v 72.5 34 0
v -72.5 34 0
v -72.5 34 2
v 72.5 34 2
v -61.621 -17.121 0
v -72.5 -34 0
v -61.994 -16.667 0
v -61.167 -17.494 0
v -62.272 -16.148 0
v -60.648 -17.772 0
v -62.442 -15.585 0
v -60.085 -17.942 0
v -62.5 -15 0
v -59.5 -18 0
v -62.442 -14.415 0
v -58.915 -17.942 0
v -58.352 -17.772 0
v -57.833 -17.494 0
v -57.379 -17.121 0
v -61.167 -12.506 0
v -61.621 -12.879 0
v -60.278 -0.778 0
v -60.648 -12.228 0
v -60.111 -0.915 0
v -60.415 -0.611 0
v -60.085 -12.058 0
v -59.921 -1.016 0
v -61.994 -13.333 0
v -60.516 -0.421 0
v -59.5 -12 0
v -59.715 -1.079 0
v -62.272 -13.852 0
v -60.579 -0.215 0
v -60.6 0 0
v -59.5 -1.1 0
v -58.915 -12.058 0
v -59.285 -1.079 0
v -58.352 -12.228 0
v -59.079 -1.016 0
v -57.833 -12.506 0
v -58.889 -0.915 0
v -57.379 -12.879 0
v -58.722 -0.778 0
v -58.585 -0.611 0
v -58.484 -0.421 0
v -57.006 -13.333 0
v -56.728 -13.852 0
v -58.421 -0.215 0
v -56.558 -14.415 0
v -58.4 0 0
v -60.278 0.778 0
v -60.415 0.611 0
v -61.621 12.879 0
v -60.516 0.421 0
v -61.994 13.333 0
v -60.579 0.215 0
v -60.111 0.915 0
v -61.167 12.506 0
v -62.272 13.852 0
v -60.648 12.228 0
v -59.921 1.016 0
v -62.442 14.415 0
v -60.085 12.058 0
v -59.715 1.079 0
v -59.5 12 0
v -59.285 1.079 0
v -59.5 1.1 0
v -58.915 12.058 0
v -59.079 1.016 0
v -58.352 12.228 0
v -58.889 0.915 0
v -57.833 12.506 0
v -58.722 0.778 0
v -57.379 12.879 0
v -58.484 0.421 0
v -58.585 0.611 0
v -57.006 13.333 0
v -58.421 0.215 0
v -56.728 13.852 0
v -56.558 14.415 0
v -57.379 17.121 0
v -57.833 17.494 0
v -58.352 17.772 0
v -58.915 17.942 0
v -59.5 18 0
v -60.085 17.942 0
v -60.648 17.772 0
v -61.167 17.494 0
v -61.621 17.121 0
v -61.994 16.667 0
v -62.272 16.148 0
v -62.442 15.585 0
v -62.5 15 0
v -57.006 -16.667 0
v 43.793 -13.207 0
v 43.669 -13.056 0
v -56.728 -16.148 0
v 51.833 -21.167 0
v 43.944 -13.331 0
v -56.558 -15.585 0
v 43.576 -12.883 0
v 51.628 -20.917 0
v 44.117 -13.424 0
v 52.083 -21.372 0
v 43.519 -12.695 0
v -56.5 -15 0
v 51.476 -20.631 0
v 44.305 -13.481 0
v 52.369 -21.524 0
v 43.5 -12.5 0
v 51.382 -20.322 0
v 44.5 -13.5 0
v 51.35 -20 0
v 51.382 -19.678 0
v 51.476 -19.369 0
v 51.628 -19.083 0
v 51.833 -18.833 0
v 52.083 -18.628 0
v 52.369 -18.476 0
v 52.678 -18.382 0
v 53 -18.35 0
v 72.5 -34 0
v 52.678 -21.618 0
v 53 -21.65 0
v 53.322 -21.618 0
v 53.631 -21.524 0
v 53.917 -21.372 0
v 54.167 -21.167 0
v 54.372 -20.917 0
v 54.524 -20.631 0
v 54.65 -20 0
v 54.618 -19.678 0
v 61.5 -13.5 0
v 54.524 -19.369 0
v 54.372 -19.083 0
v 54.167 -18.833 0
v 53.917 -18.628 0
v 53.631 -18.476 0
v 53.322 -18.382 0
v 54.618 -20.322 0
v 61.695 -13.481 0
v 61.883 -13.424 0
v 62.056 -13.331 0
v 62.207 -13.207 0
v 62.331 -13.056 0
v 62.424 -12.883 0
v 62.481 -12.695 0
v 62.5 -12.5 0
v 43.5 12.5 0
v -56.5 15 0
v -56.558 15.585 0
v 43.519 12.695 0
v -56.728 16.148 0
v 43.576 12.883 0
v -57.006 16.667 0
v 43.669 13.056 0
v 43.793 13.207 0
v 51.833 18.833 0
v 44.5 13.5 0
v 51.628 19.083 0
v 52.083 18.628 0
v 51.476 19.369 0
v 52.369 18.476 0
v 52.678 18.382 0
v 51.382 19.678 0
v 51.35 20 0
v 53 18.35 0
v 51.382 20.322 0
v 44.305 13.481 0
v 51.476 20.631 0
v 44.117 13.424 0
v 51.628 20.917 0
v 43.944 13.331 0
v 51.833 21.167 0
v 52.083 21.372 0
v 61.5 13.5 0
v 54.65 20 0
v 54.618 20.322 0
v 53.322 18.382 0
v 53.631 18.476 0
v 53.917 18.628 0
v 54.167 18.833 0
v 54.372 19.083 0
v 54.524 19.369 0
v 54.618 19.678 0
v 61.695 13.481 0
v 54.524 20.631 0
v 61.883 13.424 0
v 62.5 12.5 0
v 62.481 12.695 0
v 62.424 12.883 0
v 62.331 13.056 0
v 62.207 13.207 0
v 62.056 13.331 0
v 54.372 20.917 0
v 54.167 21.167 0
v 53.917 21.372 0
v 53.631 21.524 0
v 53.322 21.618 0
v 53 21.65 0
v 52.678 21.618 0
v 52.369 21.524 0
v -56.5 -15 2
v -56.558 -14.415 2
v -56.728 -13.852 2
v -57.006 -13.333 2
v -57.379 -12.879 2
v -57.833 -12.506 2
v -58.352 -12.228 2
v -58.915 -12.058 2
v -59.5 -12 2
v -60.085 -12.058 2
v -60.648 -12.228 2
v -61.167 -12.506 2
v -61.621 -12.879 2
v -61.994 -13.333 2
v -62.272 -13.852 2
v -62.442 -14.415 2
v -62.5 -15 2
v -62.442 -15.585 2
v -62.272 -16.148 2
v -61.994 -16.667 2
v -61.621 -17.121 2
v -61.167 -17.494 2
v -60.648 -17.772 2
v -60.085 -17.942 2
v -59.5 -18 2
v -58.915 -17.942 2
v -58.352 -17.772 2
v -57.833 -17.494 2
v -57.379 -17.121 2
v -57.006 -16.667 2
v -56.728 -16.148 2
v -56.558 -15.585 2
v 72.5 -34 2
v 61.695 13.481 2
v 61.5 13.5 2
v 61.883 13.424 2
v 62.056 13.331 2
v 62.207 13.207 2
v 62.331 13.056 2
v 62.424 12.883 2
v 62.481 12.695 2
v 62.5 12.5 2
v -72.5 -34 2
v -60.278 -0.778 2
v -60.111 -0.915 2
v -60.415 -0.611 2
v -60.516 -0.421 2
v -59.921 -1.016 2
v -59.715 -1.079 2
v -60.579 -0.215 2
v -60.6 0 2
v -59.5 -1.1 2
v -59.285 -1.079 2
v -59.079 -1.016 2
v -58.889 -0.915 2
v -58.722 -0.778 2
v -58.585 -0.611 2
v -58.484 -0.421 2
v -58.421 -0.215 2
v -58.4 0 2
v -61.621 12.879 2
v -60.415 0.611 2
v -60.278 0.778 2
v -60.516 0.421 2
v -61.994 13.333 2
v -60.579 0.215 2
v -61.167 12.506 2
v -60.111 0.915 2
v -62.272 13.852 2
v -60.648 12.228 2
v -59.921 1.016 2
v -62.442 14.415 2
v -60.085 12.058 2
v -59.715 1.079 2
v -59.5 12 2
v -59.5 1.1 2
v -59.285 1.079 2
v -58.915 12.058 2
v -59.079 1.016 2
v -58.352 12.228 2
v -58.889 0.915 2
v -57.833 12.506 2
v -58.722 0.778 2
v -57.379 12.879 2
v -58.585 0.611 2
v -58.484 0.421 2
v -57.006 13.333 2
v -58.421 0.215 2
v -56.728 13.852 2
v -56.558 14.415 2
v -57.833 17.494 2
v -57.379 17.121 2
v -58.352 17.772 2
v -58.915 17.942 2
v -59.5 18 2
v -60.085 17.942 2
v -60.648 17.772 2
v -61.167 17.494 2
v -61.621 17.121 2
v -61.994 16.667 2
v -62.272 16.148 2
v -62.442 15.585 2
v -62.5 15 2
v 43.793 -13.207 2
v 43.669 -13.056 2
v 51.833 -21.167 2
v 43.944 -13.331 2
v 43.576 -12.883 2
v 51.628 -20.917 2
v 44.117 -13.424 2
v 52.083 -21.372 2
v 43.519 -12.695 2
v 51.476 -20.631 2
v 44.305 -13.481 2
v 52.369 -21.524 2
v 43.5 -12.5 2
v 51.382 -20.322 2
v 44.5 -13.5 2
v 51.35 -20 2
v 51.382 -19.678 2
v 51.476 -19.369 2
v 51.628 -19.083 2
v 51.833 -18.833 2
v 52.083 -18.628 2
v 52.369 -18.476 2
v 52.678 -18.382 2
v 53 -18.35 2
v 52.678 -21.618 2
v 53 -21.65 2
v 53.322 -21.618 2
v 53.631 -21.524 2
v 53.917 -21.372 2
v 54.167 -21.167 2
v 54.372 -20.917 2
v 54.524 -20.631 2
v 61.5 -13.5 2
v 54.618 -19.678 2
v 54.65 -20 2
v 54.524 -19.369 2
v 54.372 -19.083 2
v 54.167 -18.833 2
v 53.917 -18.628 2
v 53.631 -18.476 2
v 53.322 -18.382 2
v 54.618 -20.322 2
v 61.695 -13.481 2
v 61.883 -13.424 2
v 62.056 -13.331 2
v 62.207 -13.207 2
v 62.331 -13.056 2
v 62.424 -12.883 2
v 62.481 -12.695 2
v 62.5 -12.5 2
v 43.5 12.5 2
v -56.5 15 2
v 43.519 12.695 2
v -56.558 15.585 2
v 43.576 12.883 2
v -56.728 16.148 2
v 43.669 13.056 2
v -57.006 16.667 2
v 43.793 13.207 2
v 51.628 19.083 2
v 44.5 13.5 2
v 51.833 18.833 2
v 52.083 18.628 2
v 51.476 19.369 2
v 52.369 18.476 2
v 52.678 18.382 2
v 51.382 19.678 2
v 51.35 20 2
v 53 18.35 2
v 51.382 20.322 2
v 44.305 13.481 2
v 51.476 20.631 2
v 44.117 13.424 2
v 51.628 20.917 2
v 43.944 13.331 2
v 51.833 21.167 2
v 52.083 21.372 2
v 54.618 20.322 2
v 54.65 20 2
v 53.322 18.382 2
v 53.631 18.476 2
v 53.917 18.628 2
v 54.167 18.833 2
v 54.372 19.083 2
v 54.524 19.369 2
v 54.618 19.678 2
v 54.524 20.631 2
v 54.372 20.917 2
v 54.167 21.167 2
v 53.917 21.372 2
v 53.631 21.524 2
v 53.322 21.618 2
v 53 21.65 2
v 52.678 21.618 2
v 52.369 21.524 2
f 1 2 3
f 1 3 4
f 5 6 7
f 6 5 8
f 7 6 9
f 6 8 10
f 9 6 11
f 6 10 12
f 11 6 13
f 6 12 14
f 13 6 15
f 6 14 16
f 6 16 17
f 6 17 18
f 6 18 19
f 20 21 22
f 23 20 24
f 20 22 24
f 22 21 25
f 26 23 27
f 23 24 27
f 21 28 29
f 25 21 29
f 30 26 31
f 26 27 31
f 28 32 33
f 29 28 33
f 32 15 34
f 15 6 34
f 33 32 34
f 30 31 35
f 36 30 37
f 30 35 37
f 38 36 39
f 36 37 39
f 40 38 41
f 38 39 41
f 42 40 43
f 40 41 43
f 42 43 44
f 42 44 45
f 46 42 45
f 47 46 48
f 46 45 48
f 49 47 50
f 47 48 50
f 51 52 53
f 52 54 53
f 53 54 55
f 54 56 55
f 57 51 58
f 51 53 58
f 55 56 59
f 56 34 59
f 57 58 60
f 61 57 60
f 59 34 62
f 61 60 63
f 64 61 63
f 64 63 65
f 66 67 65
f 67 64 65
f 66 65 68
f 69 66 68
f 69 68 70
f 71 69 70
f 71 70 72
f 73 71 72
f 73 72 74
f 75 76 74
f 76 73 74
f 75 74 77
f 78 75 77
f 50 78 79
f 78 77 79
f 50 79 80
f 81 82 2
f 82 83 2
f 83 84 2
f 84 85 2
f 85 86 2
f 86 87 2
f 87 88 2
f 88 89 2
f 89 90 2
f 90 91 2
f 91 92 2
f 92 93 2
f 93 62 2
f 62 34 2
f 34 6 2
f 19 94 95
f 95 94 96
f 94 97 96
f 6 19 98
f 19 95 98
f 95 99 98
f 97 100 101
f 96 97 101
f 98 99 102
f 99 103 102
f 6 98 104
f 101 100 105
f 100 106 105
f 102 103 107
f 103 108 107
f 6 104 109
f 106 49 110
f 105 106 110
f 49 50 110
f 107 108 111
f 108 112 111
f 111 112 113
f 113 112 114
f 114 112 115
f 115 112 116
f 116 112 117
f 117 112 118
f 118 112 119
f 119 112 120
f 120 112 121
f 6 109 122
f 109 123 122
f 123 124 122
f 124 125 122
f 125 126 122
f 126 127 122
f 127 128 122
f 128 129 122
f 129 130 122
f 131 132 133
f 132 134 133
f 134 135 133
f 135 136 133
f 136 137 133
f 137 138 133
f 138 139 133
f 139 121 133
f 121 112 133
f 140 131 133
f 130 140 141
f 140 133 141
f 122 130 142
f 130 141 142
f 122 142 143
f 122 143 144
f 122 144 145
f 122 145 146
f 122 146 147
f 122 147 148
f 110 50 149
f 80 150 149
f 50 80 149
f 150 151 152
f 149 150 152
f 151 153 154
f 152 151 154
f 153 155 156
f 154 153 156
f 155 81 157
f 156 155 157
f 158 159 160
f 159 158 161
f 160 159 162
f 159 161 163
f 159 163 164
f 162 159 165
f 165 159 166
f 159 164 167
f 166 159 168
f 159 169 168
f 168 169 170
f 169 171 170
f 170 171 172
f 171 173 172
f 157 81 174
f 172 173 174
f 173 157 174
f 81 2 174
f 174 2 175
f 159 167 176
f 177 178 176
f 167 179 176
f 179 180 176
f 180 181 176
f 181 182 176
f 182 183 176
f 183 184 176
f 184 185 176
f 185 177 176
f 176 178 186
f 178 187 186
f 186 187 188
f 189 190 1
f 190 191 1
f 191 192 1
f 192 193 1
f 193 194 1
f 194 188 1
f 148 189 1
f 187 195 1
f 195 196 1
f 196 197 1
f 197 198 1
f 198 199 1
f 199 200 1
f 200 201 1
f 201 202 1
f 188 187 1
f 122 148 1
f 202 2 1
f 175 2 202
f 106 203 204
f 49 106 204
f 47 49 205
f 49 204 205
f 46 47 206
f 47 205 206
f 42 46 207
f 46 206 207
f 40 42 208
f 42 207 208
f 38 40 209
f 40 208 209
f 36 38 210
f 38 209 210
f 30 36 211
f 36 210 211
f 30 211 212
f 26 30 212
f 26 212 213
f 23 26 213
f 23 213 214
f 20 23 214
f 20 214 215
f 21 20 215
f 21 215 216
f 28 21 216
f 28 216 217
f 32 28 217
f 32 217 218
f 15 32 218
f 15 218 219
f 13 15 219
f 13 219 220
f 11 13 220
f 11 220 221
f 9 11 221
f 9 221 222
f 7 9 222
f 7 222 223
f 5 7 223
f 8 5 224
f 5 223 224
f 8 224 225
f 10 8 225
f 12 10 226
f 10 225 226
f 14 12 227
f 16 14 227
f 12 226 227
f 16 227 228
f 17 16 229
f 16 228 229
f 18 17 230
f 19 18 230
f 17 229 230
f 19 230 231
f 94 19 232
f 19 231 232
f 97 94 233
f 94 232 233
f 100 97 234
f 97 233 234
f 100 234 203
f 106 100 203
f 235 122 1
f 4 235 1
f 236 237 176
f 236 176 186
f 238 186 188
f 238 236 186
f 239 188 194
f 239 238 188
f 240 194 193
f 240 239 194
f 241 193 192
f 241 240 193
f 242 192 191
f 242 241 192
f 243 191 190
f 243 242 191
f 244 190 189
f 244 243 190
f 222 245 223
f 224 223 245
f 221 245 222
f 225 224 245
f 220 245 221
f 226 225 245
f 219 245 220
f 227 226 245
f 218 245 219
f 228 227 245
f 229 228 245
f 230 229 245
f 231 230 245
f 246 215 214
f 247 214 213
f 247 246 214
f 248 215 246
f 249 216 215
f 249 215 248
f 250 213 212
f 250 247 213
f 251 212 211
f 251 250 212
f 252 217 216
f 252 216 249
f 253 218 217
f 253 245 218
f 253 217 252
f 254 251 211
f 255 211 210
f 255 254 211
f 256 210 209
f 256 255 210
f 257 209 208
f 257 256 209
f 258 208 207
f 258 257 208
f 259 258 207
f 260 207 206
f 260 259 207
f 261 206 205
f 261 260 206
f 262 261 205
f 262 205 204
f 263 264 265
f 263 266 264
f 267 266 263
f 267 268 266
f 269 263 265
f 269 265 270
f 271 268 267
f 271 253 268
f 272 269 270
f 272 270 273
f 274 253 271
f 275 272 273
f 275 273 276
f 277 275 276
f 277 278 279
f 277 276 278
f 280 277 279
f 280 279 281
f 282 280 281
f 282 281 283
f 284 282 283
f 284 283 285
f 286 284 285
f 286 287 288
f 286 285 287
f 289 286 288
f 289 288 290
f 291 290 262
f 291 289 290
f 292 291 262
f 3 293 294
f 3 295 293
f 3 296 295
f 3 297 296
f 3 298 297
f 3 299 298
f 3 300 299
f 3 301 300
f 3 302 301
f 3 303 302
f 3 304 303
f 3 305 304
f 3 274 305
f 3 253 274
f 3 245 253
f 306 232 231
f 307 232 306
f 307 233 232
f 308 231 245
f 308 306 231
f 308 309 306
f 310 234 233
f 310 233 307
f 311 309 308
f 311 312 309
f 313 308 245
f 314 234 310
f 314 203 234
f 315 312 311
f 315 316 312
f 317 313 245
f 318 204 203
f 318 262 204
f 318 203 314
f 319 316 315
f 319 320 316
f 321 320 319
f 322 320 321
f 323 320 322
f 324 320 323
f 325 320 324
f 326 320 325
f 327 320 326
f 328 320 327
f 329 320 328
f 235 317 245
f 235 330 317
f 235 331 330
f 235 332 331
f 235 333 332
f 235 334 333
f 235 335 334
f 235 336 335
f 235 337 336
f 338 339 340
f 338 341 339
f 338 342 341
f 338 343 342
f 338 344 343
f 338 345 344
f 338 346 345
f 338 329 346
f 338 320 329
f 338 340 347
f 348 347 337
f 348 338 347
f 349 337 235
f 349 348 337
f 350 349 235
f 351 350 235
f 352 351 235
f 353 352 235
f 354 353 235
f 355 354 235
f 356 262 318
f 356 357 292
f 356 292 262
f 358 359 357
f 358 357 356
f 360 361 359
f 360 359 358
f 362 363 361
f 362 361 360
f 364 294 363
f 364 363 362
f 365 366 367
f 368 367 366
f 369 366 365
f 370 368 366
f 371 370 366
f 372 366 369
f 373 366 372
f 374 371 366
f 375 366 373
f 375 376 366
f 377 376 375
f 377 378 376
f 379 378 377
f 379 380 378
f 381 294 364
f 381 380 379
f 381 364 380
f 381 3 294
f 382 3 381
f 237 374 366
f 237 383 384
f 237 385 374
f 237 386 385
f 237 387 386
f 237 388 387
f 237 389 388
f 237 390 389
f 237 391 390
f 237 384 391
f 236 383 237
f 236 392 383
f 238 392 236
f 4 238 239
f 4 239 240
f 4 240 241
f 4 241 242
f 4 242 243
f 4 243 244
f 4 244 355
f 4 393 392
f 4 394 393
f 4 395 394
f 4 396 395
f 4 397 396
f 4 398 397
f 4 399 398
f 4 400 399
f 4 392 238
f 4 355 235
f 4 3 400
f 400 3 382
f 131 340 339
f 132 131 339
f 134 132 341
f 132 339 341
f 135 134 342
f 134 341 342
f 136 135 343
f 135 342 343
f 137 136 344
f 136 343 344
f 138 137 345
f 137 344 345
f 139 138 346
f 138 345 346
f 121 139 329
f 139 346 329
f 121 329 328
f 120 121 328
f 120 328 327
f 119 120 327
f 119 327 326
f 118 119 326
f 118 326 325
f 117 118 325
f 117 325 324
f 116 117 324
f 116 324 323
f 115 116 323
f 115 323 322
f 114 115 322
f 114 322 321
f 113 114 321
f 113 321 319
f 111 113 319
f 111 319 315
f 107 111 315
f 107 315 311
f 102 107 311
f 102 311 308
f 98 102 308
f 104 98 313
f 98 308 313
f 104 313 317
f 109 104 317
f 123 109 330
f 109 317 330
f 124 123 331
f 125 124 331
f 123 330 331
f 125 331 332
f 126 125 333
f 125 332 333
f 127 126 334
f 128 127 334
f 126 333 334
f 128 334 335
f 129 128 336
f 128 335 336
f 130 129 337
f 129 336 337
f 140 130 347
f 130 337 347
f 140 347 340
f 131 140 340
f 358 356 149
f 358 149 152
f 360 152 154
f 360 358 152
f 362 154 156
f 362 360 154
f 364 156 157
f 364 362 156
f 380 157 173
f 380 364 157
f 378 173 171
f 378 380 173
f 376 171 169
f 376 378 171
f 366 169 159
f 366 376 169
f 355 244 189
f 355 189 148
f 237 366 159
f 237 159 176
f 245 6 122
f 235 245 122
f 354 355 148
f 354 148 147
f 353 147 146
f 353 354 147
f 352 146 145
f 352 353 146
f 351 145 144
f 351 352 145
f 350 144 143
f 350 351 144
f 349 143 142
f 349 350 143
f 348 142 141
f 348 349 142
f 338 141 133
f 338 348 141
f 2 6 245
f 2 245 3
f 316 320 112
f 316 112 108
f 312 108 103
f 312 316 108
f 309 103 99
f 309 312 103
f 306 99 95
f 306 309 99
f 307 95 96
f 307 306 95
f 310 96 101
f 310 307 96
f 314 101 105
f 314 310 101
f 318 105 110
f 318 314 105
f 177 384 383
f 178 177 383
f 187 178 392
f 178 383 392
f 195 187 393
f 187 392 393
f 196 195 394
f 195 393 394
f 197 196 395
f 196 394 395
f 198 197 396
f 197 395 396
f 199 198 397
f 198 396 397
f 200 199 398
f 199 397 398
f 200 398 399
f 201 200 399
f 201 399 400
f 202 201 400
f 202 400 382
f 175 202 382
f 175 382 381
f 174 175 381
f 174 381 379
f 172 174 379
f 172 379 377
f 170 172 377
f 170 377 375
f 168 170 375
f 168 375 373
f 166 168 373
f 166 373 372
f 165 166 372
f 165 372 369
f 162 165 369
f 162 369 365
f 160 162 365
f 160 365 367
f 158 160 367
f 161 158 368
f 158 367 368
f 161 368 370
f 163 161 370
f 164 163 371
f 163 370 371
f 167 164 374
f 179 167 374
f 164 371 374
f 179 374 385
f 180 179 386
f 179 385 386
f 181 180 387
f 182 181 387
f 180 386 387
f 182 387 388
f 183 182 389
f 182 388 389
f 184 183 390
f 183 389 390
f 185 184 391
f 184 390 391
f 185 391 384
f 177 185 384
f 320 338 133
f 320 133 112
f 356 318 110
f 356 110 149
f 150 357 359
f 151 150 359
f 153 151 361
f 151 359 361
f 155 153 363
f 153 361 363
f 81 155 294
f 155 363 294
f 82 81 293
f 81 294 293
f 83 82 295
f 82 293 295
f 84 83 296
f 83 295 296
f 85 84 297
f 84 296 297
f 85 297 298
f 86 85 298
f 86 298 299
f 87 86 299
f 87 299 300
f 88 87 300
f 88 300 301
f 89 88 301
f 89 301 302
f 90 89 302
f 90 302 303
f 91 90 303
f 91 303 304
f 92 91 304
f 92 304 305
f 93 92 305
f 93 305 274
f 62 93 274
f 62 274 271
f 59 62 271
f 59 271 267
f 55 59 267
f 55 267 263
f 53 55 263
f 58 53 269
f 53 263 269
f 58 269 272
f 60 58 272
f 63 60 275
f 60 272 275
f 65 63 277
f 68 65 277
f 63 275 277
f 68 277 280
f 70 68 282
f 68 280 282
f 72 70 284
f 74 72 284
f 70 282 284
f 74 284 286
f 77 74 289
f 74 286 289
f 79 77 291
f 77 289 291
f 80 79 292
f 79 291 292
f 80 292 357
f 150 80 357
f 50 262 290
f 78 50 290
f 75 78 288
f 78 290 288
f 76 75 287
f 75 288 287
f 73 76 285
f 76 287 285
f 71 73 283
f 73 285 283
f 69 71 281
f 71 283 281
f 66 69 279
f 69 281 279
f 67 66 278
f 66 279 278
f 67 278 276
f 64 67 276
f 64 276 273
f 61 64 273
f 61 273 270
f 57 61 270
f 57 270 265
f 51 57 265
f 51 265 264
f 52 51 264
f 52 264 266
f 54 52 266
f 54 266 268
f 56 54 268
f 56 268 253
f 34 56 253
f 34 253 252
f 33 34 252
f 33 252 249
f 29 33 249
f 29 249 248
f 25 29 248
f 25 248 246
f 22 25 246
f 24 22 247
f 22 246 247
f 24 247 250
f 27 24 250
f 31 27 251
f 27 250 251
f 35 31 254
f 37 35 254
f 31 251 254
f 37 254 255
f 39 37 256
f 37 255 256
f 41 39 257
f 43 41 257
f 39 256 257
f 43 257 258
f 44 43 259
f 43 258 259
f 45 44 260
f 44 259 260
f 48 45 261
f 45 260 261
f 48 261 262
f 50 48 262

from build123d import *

# Parameters (mm, degrees)
SKETCH1_W           = 145
SKETCH1_H           = 68
BOSS_EXTRUDE1_DEPTH = 2
SKETCH2_R           = 1.65
SKETCH2_R_2         = 3
SKETCH2_R_3         = 1.1
CUT_EXTRUDE1_DEPTH  = 81.101498113


with BuildPart() as part:
    # Sketch1 → Boss-Extrude1 (new body)
    with BuildSketch(Plane.XY):
        Rectangle(SKETCH1_W, SKETCH1_H)
    extrude(amount=BOSS_EXTRUDE1_DEPTH)

    # Sketch2 → Cut-Extrude1 (cut, through all)
    with BuildSketch(Plane.XY.offset(2)):
        with Locations((53, 20)):
            Circle(SKETCH2_R)
        with Locations((53, -20)):
            Circle(SKETCH2_R)
        with Locations((-59.5, 15)):
            Circle(SKETCH2_R_2)
        with Locations((-59.5, -15)):
            Circle(SKETCH2_R_2)
        with Locations((-59.5, 0)):
            Circle(SKETCH2_R_3)
        with BuildLine():
            Line((61.5, -13.5), (44.5, -13.5))
            ThreePointArc((44.5, -13.5), (43.792893219, -13.207106781), (43.5, -12.5))
            Line((43.5, -12.5), (43.5, 12.5))
            ThreePointArc((43.5, 12.5), (43.792893219, 13.207106781), (44.5, 13.5))
            Line((44.5, 13.5), (61.5, 13.5))
            ThreePointArc((61.5, 13.5), (62.207106781, 13.207106781), (62.5, 12.5))
            Line((62.5, 12.5), (62.5, -12.5))
            ThreePointArc((62.5, -12.5), (62.207106781, -13.207106781), (61.5, -13.5))
        make_face()
    extrude(amount=-CUT_EXTRUDE1_DEPTH, mode=Mode.SUBTRACT)


solid = part.part
